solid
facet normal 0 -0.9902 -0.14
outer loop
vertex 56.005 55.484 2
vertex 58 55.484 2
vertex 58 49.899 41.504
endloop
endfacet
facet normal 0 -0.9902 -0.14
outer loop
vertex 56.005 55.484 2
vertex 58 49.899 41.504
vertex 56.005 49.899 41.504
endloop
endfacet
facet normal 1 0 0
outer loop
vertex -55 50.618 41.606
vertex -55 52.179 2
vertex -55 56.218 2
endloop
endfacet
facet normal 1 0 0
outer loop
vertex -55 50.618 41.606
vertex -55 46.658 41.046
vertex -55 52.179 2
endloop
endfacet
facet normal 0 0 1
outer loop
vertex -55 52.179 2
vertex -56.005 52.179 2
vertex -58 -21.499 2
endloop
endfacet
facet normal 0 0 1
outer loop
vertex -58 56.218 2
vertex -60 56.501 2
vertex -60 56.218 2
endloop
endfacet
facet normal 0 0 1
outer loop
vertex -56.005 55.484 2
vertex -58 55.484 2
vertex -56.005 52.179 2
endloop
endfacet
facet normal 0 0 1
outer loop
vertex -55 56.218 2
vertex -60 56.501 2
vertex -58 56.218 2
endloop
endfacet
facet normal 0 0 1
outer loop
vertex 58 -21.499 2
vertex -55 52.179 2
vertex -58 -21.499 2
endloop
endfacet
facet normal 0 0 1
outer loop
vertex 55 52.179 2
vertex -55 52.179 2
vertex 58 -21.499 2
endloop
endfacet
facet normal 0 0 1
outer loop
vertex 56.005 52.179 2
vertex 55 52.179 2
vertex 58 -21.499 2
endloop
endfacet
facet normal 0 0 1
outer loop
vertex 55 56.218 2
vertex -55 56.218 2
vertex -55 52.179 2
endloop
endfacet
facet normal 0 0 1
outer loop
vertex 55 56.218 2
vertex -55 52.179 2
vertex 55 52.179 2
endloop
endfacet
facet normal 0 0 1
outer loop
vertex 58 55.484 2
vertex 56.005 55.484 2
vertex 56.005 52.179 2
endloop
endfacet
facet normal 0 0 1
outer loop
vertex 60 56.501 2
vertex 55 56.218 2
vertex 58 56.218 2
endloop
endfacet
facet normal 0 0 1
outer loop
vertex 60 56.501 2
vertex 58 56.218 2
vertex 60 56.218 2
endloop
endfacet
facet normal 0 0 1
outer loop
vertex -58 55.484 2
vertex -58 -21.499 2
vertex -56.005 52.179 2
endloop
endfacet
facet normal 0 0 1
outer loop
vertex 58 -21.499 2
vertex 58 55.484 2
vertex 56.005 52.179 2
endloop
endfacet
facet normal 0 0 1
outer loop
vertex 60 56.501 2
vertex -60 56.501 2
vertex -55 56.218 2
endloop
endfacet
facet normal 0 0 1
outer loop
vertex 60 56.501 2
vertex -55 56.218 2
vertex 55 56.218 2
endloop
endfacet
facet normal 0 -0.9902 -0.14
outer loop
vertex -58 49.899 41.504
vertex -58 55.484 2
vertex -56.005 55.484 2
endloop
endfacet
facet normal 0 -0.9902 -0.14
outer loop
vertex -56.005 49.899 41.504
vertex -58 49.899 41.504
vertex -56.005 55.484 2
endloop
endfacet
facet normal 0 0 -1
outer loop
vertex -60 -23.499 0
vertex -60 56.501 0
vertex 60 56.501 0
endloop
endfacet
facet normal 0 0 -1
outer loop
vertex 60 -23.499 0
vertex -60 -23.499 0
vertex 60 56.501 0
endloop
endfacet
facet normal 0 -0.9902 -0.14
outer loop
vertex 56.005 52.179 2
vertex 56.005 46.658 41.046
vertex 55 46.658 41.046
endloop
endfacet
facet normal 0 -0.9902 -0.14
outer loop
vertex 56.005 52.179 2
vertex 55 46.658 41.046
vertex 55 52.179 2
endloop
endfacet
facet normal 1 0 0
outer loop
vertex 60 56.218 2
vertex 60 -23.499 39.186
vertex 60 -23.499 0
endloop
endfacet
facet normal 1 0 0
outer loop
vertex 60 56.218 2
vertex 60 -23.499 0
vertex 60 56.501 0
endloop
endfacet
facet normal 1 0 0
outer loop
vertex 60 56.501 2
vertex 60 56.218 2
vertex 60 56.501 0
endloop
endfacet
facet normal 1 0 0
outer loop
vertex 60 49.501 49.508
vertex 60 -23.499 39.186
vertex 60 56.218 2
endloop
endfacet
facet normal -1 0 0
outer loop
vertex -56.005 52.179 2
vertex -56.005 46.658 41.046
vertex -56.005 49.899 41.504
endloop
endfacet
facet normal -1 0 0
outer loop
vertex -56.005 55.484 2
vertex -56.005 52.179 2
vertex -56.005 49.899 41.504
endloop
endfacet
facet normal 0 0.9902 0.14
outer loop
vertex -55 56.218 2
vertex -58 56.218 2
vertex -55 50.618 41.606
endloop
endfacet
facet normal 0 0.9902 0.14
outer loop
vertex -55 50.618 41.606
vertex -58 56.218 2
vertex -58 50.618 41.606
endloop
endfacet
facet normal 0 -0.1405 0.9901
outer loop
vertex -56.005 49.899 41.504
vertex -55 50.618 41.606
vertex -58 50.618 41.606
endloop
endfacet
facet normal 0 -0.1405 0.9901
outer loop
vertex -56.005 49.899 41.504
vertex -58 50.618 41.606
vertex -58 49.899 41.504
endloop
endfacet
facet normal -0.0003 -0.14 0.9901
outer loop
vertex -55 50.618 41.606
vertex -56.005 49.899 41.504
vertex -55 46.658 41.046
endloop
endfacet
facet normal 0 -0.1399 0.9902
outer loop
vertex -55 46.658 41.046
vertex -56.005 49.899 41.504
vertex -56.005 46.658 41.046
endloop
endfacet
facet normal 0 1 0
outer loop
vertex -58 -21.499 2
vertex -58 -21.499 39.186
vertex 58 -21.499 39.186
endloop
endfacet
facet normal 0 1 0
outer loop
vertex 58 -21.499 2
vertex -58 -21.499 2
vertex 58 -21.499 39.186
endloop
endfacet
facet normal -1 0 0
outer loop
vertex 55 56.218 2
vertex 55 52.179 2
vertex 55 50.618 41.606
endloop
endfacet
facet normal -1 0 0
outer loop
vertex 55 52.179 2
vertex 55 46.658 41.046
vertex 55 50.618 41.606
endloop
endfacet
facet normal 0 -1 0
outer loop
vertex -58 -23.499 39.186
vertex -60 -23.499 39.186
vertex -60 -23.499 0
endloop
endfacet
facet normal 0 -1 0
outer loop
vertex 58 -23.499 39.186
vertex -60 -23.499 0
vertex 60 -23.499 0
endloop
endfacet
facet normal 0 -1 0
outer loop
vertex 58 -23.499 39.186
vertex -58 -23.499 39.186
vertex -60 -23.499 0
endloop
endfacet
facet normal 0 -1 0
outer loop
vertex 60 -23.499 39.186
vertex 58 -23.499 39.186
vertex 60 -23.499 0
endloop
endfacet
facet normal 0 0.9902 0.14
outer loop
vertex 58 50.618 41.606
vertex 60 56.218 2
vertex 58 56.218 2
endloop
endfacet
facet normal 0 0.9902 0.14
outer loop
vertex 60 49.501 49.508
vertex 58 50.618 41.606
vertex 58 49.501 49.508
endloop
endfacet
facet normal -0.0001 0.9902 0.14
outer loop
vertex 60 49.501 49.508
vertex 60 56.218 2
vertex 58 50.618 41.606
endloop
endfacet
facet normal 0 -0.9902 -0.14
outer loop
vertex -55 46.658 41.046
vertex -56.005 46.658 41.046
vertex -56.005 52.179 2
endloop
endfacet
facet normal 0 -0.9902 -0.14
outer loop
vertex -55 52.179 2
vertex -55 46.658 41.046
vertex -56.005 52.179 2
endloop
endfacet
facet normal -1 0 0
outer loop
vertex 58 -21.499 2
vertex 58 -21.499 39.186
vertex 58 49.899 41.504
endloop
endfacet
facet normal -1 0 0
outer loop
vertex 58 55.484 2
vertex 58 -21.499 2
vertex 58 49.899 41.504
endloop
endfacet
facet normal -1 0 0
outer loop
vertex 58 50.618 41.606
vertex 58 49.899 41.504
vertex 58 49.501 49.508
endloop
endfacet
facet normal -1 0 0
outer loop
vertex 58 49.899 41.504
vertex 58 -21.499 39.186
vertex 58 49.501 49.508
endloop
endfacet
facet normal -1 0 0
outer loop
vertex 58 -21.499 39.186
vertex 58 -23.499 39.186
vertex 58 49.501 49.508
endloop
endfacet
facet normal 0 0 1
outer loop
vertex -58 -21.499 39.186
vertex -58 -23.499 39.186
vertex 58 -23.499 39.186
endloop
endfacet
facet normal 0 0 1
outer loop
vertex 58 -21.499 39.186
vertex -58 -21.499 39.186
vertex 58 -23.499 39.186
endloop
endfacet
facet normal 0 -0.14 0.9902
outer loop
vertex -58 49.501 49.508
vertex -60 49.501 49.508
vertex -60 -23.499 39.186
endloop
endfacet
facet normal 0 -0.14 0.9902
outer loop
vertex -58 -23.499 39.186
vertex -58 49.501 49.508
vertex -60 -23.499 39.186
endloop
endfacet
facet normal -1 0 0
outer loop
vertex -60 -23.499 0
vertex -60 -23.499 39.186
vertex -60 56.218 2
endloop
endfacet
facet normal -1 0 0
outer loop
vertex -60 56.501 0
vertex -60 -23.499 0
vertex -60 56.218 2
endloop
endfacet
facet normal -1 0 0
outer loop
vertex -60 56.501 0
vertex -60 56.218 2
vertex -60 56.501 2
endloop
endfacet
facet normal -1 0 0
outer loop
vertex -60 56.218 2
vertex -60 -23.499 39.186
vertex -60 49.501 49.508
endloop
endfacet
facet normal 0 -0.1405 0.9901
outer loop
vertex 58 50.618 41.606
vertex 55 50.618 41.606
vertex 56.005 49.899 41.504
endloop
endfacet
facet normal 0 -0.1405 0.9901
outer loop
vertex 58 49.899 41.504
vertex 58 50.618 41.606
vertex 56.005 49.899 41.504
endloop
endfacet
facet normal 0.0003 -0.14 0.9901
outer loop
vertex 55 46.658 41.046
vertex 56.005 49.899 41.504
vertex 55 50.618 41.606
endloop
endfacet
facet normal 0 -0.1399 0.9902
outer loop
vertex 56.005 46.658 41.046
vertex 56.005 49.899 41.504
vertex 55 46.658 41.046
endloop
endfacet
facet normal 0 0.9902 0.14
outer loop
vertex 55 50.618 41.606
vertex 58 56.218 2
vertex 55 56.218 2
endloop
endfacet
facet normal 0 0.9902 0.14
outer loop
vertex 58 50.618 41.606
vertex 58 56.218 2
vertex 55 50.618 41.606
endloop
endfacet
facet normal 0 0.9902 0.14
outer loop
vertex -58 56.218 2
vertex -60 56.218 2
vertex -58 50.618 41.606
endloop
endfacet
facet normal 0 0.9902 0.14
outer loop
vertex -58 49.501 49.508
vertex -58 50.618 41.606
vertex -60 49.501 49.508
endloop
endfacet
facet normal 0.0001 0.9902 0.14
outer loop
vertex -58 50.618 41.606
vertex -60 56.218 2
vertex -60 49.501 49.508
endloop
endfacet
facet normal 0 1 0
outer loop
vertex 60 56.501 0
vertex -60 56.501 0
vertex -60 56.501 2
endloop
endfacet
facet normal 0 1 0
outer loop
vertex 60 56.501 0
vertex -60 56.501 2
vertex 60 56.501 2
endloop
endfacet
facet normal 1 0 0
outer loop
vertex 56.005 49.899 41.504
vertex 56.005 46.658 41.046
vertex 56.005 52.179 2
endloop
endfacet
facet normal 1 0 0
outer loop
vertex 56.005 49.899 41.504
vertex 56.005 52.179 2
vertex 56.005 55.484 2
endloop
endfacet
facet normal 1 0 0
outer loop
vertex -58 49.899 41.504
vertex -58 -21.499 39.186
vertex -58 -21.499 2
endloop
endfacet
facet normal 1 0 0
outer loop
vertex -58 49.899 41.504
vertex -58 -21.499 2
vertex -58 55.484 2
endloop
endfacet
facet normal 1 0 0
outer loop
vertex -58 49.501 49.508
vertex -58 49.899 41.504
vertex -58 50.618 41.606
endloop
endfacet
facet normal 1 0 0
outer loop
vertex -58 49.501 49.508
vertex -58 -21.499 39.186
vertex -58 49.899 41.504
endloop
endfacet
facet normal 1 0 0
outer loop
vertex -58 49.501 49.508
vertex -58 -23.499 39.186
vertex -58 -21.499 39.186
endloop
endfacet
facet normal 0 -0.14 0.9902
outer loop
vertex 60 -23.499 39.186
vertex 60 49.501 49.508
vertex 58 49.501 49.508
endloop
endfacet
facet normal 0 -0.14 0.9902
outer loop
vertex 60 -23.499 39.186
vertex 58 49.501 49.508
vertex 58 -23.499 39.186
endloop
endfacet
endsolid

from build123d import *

# Parameters (mm, degrees)
F0_W      = 120
F0_H      = 80
F1_DEPTH  = 2
F3_DEPTH  = 2
F5_W      = 116
F5_H      = 37.1859224175
F6_DEPTH  = 2
F8_DEPTH  = 3
F9_W      = 1.9952932298
F9_H      = 3.2731545162
F10_REACH = 45.8542642129


with BuildPart() as f1:
    # F0 (on Top) → F1 (new body)
    with BuildSketch(Plane.XY):
        with Locations((0, 16.5011590771)):
            Rectangle(F0_W, F0_H)
    extrude(amount=F1_DEPTH)

    # F2 (on face) → F3 (join)
    with BuildSketch(Plane.YZ.offset(60)):
        Polygon((-23.4988409229, 2), (56.2183740699, 2), (49.5011590771, 49.5075751779), (-23.4988409229, 39.1859224175), align=None)
    extrude(amount=-F3_DEPTH)

    # F4: F1 across plane


with BuildPart() as f1_1:
    add(f1.part)
    add(f1.part.mirror(Plane.YZ))

    # F5 (on face) → F6 (join)
    with BuildSketch(Plane.XZ.offset(23.4988409229)):
        with Locations((0, 20.5929612087)):
            Rectangle(F5_W, F5_H)
    extrude(amount=-F6_DEPTH)

    # F7 (on face) → F8 (join)
    with BuildSketch(Plane.YZ.offset(-58)):
        Polygon((52.1785882537, 2), (56.2183740699, 2), (50.6183740699, 41.6060601424), (46.6577680557, 41.0460601424), align=None)
    extrude(amount=F8_DEPTH)

    f10_end = Plane(origin=(0.0757710305, 17.4568088596, 2), x_dir=(1, 0, 0), z_dir=(0, 0, 1))
    # F9 (on face) → F10 (cut, up to a plane its end follows)
    with BuildSketch(Plane(origin=(0, -4.7753622892, 33.7738010765), x_dir=(1, 0, 0), z_dir=(0, -0.14, 0.9901515036))):
        with Locations((-57.0023533851, 53.5812848711)):
            Rectangle(F9_W, F9_H)
    f10_long = extrude(amount=-F10_REACH, mode=Mode.PRIVATE)
    add(split(f10_long, bisect_by=f10_end, keep=Keep.TOP, mode=Mode.PRIVATE), mode=Mode.SUBTRACT)

    # F11: F1 across plane


with BuildPart() as f1_2:
    add(f1_1.part)
    add(f1_1.part.mirror(Plane.YZ))


solid = f1_2.part
